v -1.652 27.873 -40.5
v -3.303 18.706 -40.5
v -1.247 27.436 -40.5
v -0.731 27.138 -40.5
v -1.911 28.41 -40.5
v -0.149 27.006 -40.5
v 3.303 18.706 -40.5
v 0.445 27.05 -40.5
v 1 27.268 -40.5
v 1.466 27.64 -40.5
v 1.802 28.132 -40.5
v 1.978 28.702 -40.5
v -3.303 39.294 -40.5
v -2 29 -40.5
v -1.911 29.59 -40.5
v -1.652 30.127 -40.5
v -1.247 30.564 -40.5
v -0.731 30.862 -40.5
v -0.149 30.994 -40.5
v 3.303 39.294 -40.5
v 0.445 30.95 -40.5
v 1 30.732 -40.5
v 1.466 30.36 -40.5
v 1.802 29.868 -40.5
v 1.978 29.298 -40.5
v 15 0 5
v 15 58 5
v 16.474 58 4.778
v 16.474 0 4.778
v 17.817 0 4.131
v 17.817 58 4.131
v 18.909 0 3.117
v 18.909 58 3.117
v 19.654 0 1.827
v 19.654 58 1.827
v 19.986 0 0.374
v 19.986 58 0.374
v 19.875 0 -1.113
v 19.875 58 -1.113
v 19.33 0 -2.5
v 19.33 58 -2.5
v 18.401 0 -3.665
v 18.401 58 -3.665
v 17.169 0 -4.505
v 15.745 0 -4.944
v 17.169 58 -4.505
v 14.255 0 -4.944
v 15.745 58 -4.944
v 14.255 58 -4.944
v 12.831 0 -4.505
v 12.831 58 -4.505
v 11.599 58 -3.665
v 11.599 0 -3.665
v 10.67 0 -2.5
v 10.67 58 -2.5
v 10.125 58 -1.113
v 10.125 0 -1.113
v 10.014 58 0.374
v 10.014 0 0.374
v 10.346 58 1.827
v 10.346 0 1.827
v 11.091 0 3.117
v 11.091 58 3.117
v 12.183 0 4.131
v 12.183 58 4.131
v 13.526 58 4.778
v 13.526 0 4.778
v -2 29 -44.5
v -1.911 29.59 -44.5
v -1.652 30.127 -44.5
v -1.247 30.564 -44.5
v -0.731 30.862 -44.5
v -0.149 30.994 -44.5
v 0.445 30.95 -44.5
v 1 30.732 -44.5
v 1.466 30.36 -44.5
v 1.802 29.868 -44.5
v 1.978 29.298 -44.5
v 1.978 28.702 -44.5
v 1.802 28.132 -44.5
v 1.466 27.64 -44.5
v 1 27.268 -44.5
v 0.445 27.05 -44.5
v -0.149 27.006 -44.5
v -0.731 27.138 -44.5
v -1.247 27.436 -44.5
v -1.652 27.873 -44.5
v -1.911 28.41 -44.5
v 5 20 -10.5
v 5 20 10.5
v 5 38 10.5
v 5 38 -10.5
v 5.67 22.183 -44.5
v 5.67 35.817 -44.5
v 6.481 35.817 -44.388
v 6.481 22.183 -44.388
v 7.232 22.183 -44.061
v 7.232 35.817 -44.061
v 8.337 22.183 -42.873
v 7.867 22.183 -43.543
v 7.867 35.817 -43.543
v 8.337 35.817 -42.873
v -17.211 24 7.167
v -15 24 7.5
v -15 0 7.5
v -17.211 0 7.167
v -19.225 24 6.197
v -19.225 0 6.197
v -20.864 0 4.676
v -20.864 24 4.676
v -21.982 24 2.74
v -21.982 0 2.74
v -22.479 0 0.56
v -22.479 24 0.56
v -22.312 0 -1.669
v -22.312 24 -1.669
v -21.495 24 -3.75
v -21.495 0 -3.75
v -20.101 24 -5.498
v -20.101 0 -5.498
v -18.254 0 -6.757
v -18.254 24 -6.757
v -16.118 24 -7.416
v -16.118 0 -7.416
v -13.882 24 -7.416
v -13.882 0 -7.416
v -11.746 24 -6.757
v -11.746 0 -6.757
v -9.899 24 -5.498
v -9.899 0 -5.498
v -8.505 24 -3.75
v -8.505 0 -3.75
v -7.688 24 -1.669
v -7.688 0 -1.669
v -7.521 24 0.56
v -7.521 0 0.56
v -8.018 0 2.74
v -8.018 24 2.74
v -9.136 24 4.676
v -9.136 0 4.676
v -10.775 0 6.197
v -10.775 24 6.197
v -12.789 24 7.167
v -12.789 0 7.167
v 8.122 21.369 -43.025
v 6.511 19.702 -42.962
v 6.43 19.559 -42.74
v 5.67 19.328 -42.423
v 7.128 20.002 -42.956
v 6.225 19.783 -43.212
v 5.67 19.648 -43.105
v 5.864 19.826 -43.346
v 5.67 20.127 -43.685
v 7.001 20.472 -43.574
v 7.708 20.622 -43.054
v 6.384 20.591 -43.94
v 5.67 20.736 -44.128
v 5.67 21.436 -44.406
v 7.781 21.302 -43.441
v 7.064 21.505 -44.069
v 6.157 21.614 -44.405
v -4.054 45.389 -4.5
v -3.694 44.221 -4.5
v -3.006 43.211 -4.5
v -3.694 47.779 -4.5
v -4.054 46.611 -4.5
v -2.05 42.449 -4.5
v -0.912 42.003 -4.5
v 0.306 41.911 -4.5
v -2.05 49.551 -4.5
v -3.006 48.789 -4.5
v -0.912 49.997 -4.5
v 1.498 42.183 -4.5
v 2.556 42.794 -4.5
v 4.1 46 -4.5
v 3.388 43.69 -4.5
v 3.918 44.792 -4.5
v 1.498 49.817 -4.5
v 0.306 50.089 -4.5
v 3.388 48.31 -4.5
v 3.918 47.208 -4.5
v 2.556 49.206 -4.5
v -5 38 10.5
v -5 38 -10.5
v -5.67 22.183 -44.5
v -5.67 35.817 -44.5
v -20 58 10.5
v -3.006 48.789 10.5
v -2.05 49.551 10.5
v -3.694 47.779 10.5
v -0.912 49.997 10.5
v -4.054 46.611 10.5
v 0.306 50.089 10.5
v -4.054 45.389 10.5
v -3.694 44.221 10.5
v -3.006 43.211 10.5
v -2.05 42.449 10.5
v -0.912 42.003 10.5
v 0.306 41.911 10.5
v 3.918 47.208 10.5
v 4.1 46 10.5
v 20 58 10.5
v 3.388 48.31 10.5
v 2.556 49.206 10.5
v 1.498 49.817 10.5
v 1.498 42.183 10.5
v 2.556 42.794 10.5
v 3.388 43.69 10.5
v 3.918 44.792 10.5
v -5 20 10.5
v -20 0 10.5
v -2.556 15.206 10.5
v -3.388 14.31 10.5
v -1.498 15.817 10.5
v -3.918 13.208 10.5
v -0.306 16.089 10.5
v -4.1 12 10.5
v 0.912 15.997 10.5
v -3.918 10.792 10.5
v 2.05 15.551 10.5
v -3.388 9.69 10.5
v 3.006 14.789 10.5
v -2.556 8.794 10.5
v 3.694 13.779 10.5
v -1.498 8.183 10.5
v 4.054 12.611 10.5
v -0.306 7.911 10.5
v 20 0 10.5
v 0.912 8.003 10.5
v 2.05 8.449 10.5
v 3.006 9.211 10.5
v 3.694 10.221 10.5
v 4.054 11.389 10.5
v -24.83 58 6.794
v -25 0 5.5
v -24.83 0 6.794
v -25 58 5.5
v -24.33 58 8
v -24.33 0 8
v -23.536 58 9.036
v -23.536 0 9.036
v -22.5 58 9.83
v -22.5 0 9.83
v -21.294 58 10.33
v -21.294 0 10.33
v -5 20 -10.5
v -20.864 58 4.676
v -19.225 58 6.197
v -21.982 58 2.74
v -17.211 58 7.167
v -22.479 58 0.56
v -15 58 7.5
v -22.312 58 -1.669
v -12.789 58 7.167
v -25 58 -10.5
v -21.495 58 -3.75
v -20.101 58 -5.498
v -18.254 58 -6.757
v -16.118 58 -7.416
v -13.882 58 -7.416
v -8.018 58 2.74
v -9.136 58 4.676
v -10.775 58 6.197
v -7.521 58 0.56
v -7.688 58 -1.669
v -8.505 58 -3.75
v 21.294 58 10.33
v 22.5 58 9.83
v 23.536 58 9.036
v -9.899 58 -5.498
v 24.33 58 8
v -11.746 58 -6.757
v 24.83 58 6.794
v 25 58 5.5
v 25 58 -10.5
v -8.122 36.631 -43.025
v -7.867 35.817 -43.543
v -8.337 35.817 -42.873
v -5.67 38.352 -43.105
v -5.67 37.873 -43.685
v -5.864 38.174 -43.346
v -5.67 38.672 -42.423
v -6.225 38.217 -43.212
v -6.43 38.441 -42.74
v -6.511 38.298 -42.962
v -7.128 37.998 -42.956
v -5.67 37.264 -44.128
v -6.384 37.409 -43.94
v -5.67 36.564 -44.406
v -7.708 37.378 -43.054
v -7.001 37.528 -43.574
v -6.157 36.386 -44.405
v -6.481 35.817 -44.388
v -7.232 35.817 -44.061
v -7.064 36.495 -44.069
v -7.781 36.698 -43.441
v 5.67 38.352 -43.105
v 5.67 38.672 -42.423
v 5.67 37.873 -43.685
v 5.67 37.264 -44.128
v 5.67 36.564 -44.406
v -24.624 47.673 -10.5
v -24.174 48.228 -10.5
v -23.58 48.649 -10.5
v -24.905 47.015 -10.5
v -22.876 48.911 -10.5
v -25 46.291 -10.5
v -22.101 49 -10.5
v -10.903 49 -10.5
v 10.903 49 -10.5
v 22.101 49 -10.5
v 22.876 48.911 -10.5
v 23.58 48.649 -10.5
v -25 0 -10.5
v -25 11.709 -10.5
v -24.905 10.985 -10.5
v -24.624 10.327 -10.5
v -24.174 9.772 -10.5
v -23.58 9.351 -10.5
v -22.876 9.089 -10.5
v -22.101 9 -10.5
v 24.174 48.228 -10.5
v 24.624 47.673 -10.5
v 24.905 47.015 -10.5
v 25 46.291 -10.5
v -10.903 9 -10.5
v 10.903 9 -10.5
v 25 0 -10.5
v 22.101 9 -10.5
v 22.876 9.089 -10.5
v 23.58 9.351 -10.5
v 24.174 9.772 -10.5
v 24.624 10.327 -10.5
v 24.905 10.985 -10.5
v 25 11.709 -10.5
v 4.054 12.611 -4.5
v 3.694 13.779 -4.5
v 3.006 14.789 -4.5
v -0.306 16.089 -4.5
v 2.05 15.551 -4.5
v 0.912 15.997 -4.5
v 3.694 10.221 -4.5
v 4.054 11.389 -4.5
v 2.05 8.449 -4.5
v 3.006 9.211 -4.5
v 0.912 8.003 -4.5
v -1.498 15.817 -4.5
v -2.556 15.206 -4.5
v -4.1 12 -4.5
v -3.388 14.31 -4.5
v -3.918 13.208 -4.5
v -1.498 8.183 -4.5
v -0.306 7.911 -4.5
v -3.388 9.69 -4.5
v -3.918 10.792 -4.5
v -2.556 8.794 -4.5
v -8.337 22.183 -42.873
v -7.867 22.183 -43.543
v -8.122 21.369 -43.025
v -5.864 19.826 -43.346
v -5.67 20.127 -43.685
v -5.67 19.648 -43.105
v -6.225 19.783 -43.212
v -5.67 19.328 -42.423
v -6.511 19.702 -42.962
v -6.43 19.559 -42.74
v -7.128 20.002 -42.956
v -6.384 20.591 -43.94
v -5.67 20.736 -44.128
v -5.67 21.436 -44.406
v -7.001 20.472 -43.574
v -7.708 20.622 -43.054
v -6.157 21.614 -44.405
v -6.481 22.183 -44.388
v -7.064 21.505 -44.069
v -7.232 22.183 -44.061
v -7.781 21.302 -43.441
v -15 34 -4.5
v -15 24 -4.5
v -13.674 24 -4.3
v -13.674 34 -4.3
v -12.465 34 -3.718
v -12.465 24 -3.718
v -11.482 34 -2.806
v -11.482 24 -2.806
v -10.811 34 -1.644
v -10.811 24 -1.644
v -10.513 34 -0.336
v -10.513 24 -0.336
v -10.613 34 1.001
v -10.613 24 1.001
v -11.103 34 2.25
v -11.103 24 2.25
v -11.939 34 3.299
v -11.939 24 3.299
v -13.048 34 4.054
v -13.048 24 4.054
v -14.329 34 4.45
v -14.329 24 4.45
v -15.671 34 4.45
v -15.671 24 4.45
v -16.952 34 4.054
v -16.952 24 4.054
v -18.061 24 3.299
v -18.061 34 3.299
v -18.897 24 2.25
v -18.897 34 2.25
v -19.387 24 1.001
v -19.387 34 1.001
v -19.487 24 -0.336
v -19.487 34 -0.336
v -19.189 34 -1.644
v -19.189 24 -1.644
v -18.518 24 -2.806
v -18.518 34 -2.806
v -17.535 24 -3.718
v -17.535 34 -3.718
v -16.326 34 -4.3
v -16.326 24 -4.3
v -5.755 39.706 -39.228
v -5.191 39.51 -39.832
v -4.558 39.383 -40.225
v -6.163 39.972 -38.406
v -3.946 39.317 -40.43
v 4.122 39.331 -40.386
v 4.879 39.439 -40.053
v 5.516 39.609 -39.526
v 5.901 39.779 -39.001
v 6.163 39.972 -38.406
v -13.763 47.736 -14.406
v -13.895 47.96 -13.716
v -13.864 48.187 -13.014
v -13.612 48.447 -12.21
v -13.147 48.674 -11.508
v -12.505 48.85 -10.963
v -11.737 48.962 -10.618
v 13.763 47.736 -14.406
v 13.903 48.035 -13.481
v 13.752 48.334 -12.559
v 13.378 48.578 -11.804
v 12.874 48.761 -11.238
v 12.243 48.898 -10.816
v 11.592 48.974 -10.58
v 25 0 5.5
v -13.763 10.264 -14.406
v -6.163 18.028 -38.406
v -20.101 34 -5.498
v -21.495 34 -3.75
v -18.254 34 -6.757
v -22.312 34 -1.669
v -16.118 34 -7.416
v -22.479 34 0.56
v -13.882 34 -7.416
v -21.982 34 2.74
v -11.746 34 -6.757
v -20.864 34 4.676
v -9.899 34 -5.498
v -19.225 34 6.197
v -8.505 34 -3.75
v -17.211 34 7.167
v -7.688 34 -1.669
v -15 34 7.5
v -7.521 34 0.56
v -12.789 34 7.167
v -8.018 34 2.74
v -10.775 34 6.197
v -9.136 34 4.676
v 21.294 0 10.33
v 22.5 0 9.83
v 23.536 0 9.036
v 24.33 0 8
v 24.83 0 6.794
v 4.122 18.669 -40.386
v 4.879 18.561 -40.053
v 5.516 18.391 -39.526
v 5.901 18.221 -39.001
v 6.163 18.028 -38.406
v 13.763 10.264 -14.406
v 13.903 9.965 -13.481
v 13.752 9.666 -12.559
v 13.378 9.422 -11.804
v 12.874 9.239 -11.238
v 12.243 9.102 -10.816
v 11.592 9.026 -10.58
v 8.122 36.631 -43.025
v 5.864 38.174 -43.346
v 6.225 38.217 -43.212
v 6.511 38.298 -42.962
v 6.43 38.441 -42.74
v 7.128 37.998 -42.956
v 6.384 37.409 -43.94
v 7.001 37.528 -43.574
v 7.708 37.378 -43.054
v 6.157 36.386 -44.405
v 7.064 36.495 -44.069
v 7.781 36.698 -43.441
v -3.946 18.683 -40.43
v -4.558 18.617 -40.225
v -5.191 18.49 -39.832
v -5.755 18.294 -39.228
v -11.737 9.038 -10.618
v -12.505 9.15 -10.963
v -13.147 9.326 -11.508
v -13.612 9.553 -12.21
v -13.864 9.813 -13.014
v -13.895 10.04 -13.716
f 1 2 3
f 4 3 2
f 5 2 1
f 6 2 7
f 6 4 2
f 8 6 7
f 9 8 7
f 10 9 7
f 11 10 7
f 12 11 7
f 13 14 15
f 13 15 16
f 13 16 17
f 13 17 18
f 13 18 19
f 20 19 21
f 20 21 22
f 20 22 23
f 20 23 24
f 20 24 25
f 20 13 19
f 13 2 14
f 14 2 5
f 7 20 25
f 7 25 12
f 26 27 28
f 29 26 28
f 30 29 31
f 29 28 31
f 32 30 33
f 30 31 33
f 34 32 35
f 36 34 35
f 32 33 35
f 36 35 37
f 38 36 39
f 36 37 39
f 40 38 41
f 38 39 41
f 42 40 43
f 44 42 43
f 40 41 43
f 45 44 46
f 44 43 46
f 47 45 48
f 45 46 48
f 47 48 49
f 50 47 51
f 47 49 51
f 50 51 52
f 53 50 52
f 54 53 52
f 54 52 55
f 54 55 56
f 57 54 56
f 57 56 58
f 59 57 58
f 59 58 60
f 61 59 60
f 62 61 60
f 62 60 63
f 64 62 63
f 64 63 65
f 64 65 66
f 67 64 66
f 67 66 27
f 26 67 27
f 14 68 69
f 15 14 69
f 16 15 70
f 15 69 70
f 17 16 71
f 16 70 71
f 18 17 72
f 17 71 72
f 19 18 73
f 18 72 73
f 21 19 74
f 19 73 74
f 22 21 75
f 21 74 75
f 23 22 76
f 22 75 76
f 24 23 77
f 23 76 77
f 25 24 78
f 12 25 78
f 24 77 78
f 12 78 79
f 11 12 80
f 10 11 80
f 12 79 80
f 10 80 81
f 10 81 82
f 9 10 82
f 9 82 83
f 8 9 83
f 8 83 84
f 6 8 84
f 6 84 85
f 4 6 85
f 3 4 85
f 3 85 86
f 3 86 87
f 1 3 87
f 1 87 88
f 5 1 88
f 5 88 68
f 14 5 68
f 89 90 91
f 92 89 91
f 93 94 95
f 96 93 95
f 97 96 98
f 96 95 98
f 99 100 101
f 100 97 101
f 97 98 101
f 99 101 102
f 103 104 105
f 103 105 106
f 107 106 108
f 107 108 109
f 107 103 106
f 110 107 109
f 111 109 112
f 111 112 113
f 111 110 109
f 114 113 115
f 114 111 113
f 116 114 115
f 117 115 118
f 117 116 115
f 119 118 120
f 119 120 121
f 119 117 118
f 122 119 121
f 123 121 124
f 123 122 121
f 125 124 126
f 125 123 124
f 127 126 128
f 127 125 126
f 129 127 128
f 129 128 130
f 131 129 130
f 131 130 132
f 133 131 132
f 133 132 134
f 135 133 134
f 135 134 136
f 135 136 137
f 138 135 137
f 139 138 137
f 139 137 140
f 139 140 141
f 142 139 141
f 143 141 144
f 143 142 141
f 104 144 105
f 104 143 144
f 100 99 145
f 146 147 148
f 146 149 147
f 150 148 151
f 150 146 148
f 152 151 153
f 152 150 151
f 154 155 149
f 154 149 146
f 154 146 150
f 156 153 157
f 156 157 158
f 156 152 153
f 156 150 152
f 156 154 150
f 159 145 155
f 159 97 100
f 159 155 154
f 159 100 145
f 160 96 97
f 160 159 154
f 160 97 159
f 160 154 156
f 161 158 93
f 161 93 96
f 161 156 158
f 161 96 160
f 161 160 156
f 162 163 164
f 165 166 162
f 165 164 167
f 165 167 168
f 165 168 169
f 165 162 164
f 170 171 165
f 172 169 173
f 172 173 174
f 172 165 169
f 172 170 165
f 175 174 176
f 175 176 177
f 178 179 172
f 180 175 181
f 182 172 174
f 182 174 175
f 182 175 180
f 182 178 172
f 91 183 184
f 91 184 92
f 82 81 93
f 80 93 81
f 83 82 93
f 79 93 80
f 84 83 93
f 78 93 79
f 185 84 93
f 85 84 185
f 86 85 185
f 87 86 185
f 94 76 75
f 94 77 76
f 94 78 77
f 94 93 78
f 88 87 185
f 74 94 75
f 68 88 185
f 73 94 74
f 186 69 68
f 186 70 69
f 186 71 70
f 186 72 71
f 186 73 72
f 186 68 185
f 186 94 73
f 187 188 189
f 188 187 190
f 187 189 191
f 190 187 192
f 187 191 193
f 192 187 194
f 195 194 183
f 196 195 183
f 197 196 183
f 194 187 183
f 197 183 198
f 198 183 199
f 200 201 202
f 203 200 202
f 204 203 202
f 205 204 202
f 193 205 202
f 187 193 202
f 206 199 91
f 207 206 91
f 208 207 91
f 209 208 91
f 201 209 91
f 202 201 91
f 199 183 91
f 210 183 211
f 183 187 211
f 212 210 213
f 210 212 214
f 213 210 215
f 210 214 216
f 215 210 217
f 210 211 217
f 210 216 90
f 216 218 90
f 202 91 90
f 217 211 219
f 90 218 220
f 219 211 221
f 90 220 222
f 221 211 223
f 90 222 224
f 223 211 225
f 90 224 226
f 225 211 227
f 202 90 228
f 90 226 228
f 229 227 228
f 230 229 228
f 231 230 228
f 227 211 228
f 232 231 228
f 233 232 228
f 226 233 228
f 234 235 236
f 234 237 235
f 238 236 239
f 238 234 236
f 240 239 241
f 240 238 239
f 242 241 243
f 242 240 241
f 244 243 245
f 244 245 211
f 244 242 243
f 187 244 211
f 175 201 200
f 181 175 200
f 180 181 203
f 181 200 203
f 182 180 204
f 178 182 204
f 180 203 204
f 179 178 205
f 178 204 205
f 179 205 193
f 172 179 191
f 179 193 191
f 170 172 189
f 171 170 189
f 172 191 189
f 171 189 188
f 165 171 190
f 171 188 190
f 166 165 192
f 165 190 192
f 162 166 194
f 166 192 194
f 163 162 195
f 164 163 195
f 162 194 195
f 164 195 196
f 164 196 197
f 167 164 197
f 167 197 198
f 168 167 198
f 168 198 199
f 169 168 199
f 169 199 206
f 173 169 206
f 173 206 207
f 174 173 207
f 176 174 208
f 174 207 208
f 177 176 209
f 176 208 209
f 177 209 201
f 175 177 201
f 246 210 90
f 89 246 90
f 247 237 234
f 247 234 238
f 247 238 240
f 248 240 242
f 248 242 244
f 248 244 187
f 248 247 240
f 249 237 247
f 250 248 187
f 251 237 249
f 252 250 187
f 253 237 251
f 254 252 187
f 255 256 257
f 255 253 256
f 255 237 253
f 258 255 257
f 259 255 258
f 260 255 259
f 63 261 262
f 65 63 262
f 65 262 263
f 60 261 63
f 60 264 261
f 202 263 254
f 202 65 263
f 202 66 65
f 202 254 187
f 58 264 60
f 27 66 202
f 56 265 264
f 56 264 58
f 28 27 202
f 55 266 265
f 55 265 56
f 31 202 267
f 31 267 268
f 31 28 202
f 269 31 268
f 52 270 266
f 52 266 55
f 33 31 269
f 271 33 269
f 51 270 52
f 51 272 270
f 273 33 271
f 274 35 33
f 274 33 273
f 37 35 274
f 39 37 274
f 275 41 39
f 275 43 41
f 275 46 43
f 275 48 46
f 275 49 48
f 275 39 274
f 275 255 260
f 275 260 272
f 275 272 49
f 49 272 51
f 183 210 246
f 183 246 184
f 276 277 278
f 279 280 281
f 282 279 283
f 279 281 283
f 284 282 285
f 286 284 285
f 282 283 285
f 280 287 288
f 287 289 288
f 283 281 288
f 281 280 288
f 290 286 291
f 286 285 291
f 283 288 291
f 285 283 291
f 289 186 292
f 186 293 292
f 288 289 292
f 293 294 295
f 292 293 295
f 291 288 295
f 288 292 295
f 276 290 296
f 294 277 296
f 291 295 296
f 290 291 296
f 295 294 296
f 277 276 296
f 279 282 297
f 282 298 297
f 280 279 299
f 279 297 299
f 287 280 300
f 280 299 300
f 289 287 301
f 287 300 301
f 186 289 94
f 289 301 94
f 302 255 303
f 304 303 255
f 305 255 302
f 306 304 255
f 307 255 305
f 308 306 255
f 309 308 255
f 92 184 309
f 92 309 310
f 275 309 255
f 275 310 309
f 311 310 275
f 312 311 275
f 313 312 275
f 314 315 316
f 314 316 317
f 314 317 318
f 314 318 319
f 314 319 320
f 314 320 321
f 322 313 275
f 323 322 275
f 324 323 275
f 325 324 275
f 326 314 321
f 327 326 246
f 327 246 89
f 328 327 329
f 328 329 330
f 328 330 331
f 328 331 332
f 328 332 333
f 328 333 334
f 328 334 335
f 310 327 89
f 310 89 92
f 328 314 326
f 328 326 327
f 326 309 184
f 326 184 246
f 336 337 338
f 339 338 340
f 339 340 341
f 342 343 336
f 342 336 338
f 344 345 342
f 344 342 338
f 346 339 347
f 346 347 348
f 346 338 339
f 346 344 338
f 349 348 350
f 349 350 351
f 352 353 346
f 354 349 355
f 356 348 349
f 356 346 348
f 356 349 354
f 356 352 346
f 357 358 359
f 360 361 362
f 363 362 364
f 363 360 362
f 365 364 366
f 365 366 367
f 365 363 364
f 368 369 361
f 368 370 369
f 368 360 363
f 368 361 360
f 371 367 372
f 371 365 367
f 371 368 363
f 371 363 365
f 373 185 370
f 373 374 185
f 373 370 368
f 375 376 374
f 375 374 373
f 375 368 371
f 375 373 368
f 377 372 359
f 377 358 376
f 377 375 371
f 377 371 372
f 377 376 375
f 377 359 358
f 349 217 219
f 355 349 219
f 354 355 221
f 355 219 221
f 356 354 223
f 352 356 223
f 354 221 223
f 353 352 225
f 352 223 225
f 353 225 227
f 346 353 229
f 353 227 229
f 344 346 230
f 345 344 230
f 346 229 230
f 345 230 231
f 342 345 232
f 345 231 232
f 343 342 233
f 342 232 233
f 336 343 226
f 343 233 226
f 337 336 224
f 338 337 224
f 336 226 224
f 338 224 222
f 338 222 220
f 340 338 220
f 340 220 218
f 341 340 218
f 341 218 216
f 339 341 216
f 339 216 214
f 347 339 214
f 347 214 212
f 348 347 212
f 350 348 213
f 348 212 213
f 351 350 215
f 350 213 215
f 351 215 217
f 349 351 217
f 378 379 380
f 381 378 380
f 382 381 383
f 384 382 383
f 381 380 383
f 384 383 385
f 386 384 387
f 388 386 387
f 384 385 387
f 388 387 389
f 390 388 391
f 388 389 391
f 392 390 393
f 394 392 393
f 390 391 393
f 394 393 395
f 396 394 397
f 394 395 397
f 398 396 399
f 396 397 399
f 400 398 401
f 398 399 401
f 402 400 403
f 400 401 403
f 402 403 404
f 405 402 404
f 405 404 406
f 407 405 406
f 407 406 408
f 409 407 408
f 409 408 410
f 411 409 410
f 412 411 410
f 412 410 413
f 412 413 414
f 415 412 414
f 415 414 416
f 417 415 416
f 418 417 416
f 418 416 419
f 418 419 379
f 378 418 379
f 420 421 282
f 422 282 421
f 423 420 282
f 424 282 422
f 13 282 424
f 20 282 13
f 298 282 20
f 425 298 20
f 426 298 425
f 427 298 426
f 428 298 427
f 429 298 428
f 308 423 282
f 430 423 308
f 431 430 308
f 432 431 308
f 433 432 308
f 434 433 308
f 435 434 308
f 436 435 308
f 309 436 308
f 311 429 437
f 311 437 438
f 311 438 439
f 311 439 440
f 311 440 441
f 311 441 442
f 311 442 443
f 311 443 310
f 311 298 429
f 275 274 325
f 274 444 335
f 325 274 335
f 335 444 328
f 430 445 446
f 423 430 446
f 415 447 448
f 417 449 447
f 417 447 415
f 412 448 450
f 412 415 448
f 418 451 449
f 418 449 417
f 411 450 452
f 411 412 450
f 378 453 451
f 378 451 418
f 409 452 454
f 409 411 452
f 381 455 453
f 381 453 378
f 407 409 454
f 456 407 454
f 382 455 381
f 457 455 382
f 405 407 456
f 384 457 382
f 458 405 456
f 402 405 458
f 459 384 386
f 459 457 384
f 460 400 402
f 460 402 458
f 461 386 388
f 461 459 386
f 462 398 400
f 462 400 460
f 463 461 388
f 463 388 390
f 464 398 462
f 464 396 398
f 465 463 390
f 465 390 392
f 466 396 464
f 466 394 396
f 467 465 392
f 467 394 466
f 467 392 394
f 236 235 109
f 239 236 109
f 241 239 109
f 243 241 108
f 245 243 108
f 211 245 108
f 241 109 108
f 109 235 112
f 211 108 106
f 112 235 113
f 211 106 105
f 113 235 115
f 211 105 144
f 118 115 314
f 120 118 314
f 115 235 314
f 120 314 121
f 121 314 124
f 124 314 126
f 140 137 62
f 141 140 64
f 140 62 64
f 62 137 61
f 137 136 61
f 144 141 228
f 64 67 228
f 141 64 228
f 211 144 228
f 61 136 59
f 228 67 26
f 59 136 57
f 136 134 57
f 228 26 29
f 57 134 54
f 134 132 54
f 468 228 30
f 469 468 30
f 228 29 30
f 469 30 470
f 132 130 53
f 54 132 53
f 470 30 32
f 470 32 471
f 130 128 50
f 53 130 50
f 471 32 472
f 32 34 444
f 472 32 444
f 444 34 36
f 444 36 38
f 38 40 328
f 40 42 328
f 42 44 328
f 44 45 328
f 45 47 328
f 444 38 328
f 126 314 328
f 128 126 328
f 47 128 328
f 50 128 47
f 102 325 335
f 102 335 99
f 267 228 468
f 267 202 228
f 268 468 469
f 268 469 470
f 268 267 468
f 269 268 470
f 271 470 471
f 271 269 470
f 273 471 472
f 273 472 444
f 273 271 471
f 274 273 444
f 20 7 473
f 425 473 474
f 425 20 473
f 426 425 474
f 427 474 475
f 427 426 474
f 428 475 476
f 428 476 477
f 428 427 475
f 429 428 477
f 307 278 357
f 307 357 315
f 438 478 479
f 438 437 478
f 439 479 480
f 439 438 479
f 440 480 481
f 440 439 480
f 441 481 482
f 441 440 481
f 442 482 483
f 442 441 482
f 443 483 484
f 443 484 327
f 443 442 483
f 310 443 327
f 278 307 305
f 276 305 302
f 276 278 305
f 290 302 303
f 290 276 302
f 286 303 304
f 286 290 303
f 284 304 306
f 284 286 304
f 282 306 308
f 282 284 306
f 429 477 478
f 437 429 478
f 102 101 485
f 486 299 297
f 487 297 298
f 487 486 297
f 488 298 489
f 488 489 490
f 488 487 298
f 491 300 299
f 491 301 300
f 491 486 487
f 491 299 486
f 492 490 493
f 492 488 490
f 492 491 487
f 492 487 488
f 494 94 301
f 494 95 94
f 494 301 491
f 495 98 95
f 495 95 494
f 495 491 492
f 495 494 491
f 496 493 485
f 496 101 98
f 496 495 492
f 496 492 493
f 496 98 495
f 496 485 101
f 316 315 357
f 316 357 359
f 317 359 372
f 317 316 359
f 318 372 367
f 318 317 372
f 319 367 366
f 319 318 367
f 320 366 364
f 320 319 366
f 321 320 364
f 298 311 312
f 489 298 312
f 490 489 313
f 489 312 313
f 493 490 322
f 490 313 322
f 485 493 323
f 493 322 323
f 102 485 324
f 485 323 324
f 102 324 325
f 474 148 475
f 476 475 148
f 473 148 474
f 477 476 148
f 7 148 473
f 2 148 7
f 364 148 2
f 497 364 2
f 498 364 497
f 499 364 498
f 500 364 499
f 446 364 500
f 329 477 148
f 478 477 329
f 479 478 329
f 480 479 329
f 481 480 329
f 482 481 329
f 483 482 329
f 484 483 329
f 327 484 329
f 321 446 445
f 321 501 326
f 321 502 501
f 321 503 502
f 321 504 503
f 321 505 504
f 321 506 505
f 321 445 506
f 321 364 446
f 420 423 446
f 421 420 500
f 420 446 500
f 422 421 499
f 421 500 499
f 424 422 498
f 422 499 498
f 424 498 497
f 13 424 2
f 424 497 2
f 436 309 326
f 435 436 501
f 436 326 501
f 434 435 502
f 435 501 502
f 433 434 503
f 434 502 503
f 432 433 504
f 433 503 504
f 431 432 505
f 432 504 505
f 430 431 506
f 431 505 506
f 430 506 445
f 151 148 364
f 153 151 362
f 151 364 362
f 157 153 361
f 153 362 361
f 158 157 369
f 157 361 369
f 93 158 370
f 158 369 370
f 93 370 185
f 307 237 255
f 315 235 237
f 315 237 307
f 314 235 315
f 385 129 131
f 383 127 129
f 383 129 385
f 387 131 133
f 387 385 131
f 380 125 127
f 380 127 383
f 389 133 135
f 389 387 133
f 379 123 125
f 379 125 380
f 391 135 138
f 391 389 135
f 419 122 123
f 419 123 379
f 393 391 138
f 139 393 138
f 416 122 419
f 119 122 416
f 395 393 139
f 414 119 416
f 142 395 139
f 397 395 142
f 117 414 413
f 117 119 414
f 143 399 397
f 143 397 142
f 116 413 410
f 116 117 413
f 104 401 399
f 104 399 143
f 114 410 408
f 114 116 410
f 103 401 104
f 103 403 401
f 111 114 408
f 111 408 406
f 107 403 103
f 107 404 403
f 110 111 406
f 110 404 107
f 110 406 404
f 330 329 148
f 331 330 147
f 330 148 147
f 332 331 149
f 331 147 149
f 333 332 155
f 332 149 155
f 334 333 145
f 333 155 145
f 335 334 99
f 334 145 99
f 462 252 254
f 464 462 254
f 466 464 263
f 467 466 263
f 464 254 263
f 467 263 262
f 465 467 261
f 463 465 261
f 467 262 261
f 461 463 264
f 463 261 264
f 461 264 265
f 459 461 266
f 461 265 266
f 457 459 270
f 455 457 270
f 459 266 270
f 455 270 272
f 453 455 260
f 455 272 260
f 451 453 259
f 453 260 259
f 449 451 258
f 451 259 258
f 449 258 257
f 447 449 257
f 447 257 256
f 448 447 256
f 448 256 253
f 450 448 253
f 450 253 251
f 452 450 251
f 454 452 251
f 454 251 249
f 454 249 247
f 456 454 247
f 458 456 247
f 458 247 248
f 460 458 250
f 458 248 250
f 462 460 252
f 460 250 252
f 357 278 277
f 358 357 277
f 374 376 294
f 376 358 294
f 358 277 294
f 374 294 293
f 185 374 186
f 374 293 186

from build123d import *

# Parameters (mm, degrees)
SKETCH1_W           = 50
SKETCH1_H           = 21
BOSS_EXTRUDE1_DEPTH = 58
SKETCH3_R           = 7.5
CUT_EXTRUDE1_DEPTH  = 24
CUT_EXTRUDE2_REACH  = 66.025
SKETCH4_R           = 5
CUT_EXTRUDE3_START  = -24
SKETCH5_R           = 7.5
CUT_EXTRUDE3_DEPTH  = 24
CUT_EXTRUDE4_REACH  = 66.025
SKETCH6_R           = 4.5
CUT_EXTRUDE5_REACH  = 68.558
SKETCH8_W           = 10
SKETCH8_H           = 18
BOSS_EXTRUDE3_DEPTH = 20
CUT_EXTRUDE6_DEPTH  = 37.5
CUT_EXTRUDE7_REACH  = 85.75
SKETCH13_R          = 2
SKETCH7_R           = 4.1
CUT_EXTRUDE8_DEPTH  = 15
FILLET1_R           = 5
FILLET2_R           = 3
FILLET3_R           = 3
FILLET4_R           = 3


with BuildPart() as part:
    # Sketch1 → Boss-Extrude1 (new body)
    with BuildSketch(Plane(origin=(0, 0, 0), x_dir=(1, 0, 0), z_dir=(0, 1, 0))):
        Rectangle(SKETCH1_W, SKETCH1_H)
    extrude(amount=BOSS_EXTRUDE1_DEPTH)

    # Sketch3 → Cut-Extrude1 (cut)
    with BuildSketch(Plane(origin=(0, 58, 0), x_dir=(1, 0, 0), z_dir=(0, 1, 0))):
        with Locations(Location((-15, 0, 0), (0, 0, 270))):
            Circle(SKETCH3_R)
    extrude(amount=-CUT_EXTRUDE1_DEPTH, mode=Mode.SUBTRACT)

    # Sketch4 → Cut-Extrude2 (cut, up to next)
    with BuildSketch(Plane(origin=(0, 58, 0), x_dir=(1, 0, 0), z_dir=(0, 1, 0)), mode=Mode.PRIVATE) as cut_extrude2_sk1:
        with Locations(Location((15, 0, 0), (0, 0, 270))):
            Circle(SKETCH4_R)
    cut_extrude2_tool1 = extrude(cut_extrude2_sk1.sketch, amount=-CUT_EXTRUDE2_REACH, mode=Mode.PRIVATE) & part.part
    add(cut_extrude2_tool1.solids().sort_by_distance((15, 58, 0))[0], mode=Mode.SUBTRACT)

    # Sketch5 → Cut-Extrude3 (cut)
    with BuildSketch(Plane.XZ.offset(CUT_EXTRUDE3_START)):
        with Locations(Location((-15, 0, 0), (0, 0, 90))):
            Circle(SKETCH5_R)
    extrude(amount=CUT_EXTRUDE3_DEPTH, mode=Mode.SUBTRACT)

    # Sketch6 → Cut-Extrude4 (cut, up to next)
    with BuildSketch(Plane.XZ, mode=Mode.PRIVATE) as cut_extrude4_sk1:
        with Locations(Location((-15, 0, 0), (0, 0, 270))):
            Circle(SKETCH6_R)
    cut_extrude4_tool1 = extrude(cut_extrude4_sk1.sketch, amount=-CUT_EXTRUDE4_REACH, mode=Mode.PRIVATE) & part.part
    add(cut_extrude4_tool1.solids().sort_by_distance((-15, 0, 0))[0], mode=Mode.SUBTRACT)

    # Sketch8 → Cut-Extrude5 (cut, up to next)
    with BuildSketch(Plane.XY.offset(10.5), mode=Mode.PRIVATE) as cut_extrude5_sk1:
        with Locations((0, 29)):
            Rectangle(SKETCH8_W, SKETCH8_H)
    cut_extrude5_tool1 = extrude(cut_extrude5_sk1.sketch, amount=-CUT_EXTRUDE5_REACH, mode=Mode.PRIVATE) & part.part
    add(cut_extrude5_tool1.solids().sort_by_distance((0, 29, 10.5))[0], mode=Mode.SUBTRACT)

    # Sketch11 → Boss-Extrude3 (add, symmetric)
    with BuildSketch(Plane(origin=(0, 29, 0), x_dir=(0, 0, -1), z_dir=(0, 1, 0))):
        Polygon((40.5, 5.5), (40.5, -5.5), (10.5, -15), (10.5, -25), (44.5, -7.5), (44.5, 7.5), (10.5, 25), (10.5, 15), align=None)
    extrude(amount=BOSS_EXTRUDE3_DEPTH, both=True)

    # Sketch12 → Cut-Extrude6 (cut, symmetric)
    with BuildSketch(Plane.ZY):
        Polygon((-44.5, 38), (-10.5, 49), (-44.5, 49), align=None)
        Polygon((-44.5, 20), (-10.5, 9), (-44.5, 9), align=None)
    extrude(amount=CUT_EXTRUDE6_DEPTH, both=True, mode=Mode.SUBTRACT)

    # Sketch13 → Cut-Extrude7 (cut, up to next)
    with BuildSketch(Plane(origin=(0, 0, -44.5), x_dir=(-1, 0, 0), z_dir=(0, 0, -1)), mode=Mode.PRIVATE) as cut_extrude7_sk1:
        with Locations((0, 29)):
            Circle(SKETCH13_R)
    cut_extrude7_tool1 = extrude(cut_extrude7_sk1.sketch, amount=-CUT_EXTRUDE7_REACH, mode=Mode.PRIVATE) & part.part
    add(cut_extrude7_tool1.solids().sort_by_distance((0, 29, -44.5))[0], mode=Mode.SUBTRACT)

    # Sketch7 → Cut-Extrude8 (cut)
    with BuildSketch(Plane.XY.offset(10.5)):
        with Locations((0, 46)):
            Circle(SKETCH7_R)
        with Locations(Location((0, 12, 0), (0, 0, 180))):
            Circle(SKETCH7_R)
    extrude(amount=-CUT_EXTRUDE8_DEPTH, mode=Mode.SUBTRACT)

    # Fillet1
    fillet1_edges = [part.edges().sort_by_distance(p)[0] for p in [
        (25, 29, 10.5),
        (-25, 29, 10.5),
    ]]
    fillet(fillet1_edges, radius=FILLET1_R)

    # Fillet2
    fillet2_edges = [part.edges().sort_by_distance(p)[0] for p in [
        (-7.5, 29, -44.5),
        (7.5, 29, -44.5),
        (16.25, 14.5, -27.5),
        (0, 20, -44.5),
        (-16.25, 14.5, -27.5),
        (0, 38, -44.5),
        (-16.25, 43.5, -27.5),
        (16.25, 43.5, -27.5),
    ]]
    fillet(fillet2_edges, radius=FILLET2_R)

    # Fillet3
    fillet3_edges = [part.edges().sort_by_distance(p)[0] for p in [
        (5.5, 29, -40.5),
        (-5.5, 29, -40.5),
    ]]
    fillet(fillet3_edges, radius=FILLET3_R)

    # Fillet4
    fillet4_edges = [part.edges().sort_by_distance(p)[0] for p in [
        (-15, 29, -10.5),
        (15, 29, -10.5),
    ]]
    fillet(fillet4_edges, radius=FILLET4_R)


solid = part.part
